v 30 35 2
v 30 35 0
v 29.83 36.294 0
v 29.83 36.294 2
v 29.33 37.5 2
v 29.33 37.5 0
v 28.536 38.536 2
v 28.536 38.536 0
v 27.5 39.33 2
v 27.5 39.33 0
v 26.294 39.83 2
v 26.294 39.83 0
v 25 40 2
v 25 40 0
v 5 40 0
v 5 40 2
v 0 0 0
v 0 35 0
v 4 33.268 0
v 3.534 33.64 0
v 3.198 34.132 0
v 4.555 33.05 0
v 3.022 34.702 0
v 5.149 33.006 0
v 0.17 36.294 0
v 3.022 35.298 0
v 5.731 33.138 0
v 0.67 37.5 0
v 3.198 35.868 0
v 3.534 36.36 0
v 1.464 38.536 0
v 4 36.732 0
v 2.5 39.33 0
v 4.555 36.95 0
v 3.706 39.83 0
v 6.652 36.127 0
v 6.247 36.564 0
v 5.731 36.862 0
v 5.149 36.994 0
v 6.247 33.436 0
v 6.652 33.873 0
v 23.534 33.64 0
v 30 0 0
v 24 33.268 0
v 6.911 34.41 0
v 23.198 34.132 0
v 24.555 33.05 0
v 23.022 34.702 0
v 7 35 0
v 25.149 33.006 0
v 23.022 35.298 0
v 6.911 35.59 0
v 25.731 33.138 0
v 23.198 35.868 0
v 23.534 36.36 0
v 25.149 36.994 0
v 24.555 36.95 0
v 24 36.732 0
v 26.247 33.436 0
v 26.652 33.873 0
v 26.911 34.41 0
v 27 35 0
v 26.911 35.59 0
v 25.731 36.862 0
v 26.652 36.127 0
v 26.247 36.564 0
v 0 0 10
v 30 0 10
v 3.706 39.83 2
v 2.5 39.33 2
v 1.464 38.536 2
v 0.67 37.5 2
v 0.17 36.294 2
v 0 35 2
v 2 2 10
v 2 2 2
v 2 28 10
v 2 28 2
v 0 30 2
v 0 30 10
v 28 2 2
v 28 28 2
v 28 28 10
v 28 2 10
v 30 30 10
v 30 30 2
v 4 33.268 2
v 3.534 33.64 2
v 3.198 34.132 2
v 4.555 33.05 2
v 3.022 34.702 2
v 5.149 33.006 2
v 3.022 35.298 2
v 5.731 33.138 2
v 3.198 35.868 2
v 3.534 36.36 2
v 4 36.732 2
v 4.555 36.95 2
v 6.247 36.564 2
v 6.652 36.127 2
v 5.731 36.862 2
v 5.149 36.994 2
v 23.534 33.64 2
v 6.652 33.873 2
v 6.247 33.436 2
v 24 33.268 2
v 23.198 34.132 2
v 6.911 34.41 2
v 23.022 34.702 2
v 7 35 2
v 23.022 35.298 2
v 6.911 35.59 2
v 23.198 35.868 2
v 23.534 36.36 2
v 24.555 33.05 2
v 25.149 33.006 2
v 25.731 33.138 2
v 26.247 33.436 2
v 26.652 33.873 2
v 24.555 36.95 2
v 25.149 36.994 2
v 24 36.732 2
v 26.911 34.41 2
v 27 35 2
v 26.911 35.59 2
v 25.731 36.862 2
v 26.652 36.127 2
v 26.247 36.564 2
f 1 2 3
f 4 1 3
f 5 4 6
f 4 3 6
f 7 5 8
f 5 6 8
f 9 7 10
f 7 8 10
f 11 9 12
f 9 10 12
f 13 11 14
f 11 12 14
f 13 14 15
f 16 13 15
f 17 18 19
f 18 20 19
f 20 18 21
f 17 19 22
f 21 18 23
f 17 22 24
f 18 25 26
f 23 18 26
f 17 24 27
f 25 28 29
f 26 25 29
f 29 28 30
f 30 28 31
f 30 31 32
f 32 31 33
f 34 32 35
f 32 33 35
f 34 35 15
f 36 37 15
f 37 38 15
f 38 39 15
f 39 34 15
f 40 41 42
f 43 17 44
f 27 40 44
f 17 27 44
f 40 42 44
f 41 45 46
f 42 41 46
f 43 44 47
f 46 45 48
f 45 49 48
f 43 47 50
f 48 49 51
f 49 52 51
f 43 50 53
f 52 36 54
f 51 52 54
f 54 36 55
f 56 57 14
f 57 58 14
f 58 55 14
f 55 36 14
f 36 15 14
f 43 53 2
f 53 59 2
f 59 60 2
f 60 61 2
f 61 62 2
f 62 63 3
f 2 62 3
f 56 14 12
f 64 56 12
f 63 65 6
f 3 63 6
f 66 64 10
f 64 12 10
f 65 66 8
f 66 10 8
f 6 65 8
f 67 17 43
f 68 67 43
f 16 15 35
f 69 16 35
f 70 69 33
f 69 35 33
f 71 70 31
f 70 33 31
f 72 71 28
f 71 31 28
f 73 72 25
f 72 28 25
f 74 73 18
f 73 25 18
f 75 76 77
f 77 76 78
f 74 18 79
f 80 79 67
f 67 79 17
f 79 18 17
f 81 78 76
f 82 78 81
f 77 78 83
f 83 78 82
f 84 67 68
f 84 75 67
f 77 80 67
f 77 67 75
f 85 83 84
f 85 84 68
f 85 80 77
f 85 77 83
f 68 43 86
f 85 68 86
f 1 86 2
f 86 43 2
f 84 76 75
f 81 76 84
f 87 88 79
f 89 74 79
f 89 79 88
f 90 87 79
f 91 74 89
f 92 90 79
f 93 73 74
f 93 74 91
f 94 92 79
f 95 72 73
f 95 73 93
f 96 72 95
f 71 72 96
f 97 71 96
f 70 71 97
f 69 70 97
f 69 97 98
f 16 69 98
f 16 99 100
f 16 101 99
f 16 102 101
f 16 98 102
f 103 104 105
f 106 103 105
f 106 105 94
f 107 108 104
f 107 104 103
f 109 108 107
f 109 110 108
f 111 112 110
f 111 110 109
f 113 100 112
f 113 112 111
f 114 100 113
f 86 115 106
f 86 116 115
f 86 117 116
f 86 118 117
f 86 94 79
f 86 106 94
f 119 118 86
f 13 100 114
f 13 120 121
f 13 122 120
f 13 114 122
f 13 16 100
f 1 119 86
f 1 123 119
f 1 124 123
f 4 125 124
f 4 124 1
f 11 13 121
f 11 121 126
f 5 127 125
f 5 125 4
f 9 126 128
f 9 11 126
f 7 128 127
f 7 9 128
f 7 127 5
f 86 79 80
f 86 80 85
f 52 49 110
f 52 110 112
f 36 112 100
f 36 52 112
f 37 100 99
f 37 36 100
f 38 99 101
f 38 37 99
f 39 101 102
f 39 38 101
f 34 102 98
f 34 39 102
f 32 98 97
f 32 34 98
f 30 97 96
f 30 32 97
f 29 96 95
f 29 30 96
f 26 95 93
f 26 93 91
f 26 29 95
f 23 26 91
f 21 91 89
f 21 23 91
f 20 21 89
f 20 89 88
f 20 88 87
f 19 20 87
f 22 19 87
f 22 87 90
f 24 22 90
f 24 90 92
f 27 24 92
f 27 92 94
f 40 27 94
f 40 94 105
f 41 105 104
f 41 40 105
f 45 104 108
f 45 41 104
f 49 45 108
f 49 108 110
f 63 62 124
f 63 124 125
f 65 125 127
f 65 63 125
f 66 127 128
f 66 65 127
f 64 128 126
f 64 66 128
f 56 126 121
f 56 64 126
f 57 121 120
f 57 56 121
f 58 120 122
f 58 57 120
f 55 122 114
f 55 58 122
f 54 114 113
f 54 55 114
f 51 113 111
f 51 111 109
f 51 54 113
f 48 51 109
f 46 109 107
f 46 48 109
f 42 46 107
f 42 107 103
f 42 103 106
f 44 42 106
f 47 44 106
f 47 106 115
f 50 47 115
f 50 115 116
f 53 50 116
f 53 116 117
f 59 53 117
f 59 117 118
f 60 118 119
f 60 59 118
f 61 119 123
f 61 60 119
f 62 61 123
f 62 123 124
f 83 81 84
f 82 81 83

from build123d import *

# Parameters (mm, degrees)
BOX_W        = 30
BOX_H        = 30
BOX_DEPTH    = 10
BOX001_W     = 26
BOX001_H     = 26
BOX001_DEPTH = 8
SKETCH_R     = 2
PAD_DEPTH    = 2


with BuildPart() as part:
    # Box → Box (join)
    with BuildSketch(Plane.XY):
        with Locations((15, 15)):
            Rectangle(BOX_W, BOX_H)
    extrude(amount=BOX_DEPTH)

    # Box001 → Box001 (cut)
    with BuildSketch(Plane(origin=(2, 2, 2), x_dir=(1, 0, 0), z_dir=(0, 0, 1))):
        with Locations((13, 13)):
            Rectangle(BOX001_W, BOX001_H)
    extrude(amount=BOX001_DEPTH, mode=Mode.SUBTRACT)

    # Sketch → Pad (join)
    with BuildSketch(Plane.XY):
        with BuildLine():
            Line((0, 35), (0, 30))
            ThreePointArc((0, 30), (1.464466, 26.464466), (5, 25))
            Line((5, 25), (25, 25))
            ThreePointArc((25, 25), (28.535534, 26.464466), (30, 30))
            Line((30, 30), (30, 35))
            ThreePointArc((30, 35), (28.535534, 38.535534), (25, 40))
            Line((25, 40), (5, 40))
            ThreePointArc((5, 40), (1.464466, 38.535534), (0, 35))
        make_face()
        with Locations((5, 35)):
            Circle(SKETCH_R, mode=Mode.SUBTRACT)
        with Locations((25, 35)):
            Circle(SKETCH_R, mode=Mode.SUBTRACT)
    extrude(amount=PAD_DEPTH)


solid = part.part
